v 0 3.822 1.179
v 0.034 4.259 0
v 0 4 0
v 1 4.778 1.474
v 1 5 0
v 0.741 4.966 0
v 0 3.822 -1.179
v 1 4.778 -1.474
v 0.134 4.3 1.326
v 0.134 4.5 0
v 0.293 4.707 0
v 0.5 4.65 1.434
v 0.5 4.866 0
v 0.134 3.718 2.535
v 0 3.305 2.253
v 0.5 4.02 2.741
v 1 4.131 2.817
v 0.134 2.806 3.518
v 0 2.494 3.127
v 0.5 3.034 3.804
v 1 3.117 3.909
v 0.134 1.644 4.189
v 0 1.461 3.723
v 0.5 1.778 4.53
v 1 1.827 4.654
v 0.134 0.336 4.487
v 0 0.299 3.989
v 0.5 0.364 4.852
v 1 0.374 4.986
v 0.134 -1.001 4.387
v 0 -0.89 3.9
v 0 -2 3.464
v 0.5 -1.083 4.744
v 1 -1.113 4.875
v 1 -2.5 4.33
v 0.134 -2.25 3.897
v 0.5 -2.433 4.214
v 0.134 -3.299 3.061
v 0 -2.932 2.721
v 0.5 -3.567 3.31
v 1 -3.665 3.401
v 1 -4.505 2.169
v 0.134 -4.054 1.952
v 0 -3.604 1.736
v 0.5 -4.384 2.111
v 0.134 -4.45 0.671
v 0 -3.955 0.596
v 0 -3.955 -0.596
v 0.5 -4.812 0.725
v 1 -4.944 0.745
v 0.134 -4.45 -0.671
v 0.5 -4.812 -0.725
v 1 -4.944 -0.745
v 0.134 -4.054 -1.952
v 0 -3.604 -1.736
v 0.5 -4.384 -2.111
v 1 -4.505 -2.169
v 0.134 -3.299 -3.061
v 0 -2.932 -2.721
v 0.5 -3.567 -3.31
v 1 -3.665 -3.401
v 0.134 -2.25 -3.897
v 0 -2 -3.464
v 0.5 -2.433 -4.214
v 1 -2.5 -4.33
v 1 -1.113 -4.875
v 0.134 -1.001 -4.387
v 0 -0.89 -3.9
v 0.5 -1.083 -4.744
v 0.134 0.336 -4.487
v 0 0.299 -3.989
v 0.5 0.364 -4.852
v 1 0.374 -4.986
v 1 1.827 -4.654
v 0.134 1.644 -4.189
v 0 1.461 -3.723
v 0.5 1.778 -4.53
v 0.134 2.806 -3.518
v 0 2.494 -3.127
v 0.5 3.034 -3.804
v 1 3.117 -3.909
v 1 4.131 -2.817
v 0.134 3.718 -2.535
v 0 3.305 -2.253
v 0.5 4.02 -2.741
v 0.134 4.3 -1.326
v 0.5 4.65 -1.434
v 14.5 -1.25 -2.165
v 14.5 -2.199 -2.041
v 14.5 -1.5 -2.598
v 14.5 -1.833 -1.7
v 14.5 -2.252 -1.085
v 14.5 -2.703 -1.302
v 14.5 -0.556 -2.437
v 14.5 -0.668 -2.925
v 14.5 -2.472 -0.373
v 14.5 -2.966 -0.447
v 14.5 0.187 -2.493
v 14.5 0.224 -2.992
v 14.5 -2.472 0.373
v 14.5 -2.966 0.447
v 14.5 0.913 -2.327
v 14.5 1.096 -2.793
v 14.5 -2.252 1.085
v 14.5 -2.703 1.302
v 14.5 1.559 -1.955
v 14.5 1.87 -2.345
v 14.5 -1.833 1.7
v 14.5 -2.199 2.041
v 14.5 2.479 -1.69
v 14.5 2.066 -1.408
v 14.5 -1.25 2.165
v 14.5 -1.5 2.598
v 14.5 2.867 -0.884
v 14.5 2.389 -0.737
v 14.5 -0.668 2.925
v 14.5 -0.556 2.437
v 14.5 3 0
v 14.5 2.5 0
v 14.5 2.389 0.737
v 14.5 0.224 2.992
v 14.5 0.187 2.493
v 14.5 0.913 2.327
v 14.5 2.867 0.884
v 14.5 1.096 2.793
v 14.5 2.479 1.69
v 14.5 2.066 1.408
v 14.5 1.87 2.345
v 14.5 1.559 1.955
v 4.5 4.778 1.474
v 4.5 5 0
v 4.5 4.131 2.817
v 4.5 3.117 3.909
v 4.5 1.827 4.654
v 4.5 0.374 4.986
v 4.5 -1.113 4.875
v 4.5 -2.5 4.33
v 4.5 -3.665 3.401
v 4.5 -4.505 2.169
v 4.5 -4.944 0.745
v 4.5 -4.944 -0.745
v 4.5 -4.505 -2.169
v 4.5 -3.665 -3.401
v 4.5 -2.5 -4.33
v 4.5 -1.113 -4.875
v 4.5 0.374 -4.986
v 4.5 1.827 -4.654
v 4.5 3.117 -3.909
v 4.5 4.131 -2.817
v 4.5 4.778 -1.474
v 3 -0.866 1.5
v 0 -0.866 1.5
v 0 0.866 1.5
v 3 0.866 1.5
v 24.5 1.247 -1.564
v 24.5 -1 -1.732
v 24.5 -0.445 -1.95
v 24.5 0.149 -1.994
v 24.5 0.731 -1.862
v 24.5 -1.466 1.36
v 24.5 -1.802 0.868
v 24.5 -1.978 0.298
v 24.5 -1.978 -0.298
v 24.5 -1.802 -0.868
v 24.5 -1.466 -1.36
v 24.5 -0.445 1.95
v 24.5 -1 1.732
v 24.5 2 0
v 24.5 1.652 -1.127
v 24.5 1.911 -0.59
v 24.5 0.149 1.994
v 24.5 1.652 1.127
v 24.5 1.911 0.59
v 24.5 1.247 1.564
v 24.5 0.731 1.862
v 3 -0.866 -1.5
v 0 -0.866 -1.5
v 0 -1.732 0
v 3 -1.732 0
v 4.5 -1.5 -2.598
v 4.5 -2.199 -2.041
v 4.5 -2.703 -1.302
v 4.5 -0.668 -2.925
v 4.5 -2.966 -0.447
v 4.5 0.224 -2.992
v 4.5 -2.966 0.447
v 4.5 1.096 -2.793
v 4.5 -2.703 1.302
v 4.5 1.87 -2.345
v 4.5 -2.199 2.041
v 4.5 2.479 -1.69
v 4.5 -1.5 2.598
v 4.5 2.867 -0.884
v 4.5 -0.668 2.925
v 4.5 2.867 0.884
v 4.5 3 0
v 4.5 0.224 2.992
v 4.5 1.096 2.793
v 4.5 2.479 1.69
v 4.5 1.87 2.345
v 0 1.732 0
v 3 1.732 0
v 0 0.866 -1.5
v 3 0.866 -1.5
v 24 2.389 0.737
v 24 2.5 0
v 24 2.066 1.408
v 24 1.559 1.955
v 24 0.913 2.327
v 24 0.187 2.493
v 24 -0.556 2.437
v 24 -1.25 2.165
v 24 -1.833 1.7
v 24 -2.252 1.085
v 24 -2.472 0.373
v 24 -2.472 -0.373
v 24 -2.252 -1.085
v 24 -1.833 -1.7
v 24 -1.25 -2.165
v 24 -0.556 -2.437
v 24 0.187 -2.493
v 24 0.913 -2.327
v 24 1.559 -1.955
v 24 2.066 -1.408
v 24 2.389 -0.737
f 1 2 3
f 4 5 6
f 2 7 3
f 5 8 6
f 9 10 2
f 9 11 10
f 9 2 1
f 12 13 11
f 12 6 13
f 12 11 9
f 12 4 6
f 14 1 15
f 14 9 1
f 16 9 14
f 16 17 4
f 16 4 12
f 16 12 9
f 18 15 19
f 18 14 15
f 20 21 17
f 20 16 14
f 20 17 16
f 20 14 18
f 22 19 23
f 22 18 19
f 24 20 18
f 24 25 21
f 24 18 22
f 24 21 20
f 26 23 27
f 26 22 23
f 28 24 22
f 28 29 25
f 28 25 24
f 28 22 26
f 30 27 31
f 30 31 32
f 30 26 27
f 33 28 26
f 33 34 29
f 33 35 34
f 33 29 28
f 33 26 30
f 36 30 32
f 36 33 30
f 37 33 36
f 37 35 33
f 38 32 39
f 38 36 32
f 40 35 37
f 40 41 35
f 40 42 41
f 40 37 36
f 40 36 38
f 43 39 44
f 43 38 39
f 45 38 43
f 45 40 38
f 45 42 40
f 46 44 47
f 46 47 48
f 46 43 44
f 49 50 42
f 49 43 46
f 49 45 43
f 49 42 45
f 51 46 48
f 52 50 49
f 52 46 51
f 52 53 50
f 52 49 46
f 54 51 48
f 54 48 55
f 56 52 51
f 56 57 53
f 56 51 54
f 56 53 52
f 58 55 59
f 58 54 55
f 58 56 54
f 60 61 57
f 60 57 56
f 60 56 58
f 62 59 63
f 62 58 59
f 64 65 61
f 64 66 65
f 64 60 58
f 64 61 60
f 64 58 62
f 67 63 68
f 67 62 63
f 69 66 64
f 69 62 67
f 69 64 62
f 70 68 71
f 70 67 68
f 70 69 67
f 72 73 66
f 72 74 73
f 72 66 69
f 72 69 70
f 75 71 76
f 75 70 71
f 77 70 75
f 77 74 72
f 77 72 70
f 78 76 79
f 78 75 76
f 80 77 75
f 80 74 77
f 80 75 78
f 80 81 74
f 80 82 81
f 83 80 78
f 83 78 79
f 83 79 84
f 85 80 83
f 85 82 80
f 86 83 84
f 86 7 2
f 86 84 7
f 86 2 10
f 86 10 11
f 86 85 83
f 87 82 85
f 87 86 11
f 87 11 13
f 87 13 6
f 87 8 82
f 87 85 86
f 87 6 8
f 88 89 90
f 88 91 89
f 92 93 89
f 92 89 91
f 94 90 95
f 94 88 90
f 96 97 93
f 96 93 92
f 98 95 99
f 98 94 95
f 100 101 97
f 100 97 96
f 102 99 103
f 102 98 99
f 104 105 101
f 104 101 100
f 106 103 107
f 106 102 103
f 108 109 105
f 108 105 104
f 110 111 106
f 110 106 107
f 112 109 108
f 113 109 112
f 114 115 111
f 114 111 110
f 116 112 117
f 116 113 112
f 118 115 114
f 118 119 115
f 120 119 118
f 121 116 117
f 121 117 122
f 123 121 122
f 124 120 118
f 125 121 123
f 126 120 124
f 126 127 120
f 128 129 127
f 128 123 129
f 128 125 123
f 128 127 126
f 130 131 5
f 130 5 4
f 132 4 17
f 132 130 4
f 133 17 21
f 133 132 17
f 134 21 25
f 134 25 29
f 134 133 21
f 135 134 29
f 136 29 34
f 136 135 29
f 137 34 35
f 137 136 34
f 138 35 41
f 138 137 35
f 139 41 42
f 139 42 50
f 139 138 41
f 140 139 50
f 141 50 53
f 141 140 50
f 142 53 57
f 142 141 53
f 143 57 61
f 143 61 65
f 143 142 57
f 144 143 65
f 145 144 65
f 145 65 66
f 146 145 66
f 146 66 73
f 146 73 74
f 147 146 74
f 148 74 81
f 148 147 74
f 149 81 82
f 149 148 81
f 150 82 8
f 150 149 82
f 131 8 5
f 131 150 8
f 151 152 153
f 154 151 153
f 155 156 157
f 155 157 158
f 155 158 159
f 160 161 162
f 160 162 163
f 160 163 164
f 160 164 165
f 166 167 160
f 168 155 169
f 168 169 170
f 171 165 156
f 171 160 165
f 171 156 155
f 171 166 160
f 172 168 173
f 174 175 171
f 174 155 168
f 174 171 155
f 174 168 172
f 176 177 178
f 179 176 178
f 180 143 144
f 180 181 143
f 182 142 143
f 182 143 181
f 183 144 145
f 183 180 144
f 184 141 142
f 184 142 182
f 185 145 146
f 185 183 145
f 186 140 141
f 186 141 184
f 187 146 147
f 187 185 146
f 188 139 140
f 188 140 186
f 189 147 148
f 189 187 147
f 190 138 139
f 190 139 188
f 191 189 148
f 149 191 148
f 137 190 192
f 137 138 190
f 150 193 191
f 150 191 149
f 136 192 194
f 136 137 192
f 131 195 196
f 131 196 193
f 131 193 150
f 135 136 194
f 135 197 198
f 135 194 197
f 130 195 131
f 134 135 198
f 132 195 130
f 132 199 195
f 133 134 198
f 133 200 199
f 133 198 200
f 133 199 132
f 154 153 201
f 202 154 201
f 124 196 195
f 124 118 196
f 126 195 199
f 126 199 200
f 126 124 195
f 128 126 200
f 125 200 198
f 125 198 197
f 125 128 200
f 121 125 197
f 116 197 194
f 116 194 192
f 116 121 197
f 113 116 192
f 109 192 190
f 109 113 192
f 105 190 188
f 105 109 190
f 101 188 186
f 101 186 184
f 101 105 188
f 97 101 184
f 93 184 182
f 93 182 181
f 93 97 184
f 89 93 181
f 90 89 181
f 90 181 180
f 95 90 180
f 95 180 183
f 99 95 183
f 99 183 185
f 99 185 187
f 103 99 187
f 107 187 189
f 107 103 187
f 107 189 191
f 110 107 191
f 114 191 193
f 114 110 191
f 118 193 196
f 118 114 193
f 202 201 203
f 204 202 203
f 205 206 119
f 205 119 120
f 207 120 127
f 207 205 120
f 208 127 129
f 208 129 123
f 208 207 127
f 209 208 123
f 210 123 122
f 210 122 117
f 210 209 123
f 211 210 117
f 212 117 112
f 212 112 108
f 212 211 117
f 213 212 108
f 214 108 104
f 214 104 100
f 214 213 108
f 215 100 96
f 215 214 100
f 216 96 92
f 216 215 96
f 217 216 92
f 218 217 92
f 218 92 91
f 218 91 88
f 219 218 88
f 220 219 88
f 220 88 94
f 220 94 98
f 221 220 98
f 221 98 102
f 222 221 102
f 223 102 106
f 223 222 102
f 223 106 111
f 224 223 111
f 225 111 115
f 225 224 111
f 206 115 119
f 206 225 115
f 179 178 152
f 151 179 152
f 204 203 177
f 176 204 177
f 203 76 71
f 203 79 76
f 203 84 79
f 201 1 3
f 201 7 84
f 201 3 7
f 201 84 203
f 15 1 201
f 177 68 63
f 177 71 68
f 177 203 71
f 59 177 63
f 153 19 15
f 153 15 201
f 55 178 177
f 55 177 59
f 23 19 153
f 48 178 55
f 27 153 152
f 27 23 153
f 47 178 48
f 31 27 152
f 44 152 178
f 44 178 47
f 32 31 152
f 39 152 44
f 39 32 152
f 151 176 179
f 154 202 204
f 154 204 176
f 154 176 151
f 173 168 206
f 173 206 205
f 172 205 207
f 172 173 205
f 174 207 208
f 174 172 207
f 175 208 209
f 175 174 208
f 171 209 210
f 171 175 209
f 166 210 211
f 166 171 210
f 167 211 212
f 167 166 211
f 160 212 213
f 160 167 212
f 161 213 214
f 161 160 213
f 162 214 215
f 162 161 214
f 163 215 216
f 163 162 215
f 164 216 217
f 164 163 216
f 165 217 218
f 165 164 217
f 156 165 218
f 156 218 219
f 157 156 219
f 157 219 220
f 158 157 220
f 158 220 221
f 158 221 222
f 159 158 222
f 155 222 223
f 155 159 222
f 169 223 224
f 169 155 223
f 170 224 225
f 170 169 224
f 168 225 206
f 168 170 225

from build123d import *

# Parameters (mm, degrees)
CUT_EXTRUDE_1_DEPTH = 3
FILLET_1_R          = 1
CHAMFER_1_SIZE      = 0.5


with BuildPart() as part:
    # 草图1 → 旋转1 (revolve)
    with BuildSketch(Plane.XY):
        Polygon((0, 0), (0, 5), (4.5, 5), (4.5, 3), (14.5, 3), (14.5, 2.5), (24.5, 2.5), (24.5, 0), align=None)
    revolve(axis=Axis((0, 0, 0), (1, 0, 0)))

    # 草图2 → 切除-拉伸1 (cut)
    with BuildSketch(Plane.ZY):
        Polygon((0, 1.732050808), (-1.5, 0.866025404), (-1.5, -0.866025404), (0, -1.732050808), (1.5, -0.866025404), (1.5, 0.866025404), align=None)
    extrude(amount=-CUT_EXTRUDE_1_DEPTH, mode=Mode.SUBTRACT)

    # 圆角1
    fillet_1_edges = [part.edges().sort_by_distance(p)[0] for p in [
        (0, -5, 0),
    ]]
    fillet(fillet_1_edges, radius=FILLET_1_R)

    # 倒角1
    chamfer_1_edges = [part.edges().sort_by_distance(p)[0] for p in [
        (24.5, -2.5, 0),
    ]]
    chamfer(chamfer_1_edges, length=CHAMFER_1_SIZE)


solid = part.part
